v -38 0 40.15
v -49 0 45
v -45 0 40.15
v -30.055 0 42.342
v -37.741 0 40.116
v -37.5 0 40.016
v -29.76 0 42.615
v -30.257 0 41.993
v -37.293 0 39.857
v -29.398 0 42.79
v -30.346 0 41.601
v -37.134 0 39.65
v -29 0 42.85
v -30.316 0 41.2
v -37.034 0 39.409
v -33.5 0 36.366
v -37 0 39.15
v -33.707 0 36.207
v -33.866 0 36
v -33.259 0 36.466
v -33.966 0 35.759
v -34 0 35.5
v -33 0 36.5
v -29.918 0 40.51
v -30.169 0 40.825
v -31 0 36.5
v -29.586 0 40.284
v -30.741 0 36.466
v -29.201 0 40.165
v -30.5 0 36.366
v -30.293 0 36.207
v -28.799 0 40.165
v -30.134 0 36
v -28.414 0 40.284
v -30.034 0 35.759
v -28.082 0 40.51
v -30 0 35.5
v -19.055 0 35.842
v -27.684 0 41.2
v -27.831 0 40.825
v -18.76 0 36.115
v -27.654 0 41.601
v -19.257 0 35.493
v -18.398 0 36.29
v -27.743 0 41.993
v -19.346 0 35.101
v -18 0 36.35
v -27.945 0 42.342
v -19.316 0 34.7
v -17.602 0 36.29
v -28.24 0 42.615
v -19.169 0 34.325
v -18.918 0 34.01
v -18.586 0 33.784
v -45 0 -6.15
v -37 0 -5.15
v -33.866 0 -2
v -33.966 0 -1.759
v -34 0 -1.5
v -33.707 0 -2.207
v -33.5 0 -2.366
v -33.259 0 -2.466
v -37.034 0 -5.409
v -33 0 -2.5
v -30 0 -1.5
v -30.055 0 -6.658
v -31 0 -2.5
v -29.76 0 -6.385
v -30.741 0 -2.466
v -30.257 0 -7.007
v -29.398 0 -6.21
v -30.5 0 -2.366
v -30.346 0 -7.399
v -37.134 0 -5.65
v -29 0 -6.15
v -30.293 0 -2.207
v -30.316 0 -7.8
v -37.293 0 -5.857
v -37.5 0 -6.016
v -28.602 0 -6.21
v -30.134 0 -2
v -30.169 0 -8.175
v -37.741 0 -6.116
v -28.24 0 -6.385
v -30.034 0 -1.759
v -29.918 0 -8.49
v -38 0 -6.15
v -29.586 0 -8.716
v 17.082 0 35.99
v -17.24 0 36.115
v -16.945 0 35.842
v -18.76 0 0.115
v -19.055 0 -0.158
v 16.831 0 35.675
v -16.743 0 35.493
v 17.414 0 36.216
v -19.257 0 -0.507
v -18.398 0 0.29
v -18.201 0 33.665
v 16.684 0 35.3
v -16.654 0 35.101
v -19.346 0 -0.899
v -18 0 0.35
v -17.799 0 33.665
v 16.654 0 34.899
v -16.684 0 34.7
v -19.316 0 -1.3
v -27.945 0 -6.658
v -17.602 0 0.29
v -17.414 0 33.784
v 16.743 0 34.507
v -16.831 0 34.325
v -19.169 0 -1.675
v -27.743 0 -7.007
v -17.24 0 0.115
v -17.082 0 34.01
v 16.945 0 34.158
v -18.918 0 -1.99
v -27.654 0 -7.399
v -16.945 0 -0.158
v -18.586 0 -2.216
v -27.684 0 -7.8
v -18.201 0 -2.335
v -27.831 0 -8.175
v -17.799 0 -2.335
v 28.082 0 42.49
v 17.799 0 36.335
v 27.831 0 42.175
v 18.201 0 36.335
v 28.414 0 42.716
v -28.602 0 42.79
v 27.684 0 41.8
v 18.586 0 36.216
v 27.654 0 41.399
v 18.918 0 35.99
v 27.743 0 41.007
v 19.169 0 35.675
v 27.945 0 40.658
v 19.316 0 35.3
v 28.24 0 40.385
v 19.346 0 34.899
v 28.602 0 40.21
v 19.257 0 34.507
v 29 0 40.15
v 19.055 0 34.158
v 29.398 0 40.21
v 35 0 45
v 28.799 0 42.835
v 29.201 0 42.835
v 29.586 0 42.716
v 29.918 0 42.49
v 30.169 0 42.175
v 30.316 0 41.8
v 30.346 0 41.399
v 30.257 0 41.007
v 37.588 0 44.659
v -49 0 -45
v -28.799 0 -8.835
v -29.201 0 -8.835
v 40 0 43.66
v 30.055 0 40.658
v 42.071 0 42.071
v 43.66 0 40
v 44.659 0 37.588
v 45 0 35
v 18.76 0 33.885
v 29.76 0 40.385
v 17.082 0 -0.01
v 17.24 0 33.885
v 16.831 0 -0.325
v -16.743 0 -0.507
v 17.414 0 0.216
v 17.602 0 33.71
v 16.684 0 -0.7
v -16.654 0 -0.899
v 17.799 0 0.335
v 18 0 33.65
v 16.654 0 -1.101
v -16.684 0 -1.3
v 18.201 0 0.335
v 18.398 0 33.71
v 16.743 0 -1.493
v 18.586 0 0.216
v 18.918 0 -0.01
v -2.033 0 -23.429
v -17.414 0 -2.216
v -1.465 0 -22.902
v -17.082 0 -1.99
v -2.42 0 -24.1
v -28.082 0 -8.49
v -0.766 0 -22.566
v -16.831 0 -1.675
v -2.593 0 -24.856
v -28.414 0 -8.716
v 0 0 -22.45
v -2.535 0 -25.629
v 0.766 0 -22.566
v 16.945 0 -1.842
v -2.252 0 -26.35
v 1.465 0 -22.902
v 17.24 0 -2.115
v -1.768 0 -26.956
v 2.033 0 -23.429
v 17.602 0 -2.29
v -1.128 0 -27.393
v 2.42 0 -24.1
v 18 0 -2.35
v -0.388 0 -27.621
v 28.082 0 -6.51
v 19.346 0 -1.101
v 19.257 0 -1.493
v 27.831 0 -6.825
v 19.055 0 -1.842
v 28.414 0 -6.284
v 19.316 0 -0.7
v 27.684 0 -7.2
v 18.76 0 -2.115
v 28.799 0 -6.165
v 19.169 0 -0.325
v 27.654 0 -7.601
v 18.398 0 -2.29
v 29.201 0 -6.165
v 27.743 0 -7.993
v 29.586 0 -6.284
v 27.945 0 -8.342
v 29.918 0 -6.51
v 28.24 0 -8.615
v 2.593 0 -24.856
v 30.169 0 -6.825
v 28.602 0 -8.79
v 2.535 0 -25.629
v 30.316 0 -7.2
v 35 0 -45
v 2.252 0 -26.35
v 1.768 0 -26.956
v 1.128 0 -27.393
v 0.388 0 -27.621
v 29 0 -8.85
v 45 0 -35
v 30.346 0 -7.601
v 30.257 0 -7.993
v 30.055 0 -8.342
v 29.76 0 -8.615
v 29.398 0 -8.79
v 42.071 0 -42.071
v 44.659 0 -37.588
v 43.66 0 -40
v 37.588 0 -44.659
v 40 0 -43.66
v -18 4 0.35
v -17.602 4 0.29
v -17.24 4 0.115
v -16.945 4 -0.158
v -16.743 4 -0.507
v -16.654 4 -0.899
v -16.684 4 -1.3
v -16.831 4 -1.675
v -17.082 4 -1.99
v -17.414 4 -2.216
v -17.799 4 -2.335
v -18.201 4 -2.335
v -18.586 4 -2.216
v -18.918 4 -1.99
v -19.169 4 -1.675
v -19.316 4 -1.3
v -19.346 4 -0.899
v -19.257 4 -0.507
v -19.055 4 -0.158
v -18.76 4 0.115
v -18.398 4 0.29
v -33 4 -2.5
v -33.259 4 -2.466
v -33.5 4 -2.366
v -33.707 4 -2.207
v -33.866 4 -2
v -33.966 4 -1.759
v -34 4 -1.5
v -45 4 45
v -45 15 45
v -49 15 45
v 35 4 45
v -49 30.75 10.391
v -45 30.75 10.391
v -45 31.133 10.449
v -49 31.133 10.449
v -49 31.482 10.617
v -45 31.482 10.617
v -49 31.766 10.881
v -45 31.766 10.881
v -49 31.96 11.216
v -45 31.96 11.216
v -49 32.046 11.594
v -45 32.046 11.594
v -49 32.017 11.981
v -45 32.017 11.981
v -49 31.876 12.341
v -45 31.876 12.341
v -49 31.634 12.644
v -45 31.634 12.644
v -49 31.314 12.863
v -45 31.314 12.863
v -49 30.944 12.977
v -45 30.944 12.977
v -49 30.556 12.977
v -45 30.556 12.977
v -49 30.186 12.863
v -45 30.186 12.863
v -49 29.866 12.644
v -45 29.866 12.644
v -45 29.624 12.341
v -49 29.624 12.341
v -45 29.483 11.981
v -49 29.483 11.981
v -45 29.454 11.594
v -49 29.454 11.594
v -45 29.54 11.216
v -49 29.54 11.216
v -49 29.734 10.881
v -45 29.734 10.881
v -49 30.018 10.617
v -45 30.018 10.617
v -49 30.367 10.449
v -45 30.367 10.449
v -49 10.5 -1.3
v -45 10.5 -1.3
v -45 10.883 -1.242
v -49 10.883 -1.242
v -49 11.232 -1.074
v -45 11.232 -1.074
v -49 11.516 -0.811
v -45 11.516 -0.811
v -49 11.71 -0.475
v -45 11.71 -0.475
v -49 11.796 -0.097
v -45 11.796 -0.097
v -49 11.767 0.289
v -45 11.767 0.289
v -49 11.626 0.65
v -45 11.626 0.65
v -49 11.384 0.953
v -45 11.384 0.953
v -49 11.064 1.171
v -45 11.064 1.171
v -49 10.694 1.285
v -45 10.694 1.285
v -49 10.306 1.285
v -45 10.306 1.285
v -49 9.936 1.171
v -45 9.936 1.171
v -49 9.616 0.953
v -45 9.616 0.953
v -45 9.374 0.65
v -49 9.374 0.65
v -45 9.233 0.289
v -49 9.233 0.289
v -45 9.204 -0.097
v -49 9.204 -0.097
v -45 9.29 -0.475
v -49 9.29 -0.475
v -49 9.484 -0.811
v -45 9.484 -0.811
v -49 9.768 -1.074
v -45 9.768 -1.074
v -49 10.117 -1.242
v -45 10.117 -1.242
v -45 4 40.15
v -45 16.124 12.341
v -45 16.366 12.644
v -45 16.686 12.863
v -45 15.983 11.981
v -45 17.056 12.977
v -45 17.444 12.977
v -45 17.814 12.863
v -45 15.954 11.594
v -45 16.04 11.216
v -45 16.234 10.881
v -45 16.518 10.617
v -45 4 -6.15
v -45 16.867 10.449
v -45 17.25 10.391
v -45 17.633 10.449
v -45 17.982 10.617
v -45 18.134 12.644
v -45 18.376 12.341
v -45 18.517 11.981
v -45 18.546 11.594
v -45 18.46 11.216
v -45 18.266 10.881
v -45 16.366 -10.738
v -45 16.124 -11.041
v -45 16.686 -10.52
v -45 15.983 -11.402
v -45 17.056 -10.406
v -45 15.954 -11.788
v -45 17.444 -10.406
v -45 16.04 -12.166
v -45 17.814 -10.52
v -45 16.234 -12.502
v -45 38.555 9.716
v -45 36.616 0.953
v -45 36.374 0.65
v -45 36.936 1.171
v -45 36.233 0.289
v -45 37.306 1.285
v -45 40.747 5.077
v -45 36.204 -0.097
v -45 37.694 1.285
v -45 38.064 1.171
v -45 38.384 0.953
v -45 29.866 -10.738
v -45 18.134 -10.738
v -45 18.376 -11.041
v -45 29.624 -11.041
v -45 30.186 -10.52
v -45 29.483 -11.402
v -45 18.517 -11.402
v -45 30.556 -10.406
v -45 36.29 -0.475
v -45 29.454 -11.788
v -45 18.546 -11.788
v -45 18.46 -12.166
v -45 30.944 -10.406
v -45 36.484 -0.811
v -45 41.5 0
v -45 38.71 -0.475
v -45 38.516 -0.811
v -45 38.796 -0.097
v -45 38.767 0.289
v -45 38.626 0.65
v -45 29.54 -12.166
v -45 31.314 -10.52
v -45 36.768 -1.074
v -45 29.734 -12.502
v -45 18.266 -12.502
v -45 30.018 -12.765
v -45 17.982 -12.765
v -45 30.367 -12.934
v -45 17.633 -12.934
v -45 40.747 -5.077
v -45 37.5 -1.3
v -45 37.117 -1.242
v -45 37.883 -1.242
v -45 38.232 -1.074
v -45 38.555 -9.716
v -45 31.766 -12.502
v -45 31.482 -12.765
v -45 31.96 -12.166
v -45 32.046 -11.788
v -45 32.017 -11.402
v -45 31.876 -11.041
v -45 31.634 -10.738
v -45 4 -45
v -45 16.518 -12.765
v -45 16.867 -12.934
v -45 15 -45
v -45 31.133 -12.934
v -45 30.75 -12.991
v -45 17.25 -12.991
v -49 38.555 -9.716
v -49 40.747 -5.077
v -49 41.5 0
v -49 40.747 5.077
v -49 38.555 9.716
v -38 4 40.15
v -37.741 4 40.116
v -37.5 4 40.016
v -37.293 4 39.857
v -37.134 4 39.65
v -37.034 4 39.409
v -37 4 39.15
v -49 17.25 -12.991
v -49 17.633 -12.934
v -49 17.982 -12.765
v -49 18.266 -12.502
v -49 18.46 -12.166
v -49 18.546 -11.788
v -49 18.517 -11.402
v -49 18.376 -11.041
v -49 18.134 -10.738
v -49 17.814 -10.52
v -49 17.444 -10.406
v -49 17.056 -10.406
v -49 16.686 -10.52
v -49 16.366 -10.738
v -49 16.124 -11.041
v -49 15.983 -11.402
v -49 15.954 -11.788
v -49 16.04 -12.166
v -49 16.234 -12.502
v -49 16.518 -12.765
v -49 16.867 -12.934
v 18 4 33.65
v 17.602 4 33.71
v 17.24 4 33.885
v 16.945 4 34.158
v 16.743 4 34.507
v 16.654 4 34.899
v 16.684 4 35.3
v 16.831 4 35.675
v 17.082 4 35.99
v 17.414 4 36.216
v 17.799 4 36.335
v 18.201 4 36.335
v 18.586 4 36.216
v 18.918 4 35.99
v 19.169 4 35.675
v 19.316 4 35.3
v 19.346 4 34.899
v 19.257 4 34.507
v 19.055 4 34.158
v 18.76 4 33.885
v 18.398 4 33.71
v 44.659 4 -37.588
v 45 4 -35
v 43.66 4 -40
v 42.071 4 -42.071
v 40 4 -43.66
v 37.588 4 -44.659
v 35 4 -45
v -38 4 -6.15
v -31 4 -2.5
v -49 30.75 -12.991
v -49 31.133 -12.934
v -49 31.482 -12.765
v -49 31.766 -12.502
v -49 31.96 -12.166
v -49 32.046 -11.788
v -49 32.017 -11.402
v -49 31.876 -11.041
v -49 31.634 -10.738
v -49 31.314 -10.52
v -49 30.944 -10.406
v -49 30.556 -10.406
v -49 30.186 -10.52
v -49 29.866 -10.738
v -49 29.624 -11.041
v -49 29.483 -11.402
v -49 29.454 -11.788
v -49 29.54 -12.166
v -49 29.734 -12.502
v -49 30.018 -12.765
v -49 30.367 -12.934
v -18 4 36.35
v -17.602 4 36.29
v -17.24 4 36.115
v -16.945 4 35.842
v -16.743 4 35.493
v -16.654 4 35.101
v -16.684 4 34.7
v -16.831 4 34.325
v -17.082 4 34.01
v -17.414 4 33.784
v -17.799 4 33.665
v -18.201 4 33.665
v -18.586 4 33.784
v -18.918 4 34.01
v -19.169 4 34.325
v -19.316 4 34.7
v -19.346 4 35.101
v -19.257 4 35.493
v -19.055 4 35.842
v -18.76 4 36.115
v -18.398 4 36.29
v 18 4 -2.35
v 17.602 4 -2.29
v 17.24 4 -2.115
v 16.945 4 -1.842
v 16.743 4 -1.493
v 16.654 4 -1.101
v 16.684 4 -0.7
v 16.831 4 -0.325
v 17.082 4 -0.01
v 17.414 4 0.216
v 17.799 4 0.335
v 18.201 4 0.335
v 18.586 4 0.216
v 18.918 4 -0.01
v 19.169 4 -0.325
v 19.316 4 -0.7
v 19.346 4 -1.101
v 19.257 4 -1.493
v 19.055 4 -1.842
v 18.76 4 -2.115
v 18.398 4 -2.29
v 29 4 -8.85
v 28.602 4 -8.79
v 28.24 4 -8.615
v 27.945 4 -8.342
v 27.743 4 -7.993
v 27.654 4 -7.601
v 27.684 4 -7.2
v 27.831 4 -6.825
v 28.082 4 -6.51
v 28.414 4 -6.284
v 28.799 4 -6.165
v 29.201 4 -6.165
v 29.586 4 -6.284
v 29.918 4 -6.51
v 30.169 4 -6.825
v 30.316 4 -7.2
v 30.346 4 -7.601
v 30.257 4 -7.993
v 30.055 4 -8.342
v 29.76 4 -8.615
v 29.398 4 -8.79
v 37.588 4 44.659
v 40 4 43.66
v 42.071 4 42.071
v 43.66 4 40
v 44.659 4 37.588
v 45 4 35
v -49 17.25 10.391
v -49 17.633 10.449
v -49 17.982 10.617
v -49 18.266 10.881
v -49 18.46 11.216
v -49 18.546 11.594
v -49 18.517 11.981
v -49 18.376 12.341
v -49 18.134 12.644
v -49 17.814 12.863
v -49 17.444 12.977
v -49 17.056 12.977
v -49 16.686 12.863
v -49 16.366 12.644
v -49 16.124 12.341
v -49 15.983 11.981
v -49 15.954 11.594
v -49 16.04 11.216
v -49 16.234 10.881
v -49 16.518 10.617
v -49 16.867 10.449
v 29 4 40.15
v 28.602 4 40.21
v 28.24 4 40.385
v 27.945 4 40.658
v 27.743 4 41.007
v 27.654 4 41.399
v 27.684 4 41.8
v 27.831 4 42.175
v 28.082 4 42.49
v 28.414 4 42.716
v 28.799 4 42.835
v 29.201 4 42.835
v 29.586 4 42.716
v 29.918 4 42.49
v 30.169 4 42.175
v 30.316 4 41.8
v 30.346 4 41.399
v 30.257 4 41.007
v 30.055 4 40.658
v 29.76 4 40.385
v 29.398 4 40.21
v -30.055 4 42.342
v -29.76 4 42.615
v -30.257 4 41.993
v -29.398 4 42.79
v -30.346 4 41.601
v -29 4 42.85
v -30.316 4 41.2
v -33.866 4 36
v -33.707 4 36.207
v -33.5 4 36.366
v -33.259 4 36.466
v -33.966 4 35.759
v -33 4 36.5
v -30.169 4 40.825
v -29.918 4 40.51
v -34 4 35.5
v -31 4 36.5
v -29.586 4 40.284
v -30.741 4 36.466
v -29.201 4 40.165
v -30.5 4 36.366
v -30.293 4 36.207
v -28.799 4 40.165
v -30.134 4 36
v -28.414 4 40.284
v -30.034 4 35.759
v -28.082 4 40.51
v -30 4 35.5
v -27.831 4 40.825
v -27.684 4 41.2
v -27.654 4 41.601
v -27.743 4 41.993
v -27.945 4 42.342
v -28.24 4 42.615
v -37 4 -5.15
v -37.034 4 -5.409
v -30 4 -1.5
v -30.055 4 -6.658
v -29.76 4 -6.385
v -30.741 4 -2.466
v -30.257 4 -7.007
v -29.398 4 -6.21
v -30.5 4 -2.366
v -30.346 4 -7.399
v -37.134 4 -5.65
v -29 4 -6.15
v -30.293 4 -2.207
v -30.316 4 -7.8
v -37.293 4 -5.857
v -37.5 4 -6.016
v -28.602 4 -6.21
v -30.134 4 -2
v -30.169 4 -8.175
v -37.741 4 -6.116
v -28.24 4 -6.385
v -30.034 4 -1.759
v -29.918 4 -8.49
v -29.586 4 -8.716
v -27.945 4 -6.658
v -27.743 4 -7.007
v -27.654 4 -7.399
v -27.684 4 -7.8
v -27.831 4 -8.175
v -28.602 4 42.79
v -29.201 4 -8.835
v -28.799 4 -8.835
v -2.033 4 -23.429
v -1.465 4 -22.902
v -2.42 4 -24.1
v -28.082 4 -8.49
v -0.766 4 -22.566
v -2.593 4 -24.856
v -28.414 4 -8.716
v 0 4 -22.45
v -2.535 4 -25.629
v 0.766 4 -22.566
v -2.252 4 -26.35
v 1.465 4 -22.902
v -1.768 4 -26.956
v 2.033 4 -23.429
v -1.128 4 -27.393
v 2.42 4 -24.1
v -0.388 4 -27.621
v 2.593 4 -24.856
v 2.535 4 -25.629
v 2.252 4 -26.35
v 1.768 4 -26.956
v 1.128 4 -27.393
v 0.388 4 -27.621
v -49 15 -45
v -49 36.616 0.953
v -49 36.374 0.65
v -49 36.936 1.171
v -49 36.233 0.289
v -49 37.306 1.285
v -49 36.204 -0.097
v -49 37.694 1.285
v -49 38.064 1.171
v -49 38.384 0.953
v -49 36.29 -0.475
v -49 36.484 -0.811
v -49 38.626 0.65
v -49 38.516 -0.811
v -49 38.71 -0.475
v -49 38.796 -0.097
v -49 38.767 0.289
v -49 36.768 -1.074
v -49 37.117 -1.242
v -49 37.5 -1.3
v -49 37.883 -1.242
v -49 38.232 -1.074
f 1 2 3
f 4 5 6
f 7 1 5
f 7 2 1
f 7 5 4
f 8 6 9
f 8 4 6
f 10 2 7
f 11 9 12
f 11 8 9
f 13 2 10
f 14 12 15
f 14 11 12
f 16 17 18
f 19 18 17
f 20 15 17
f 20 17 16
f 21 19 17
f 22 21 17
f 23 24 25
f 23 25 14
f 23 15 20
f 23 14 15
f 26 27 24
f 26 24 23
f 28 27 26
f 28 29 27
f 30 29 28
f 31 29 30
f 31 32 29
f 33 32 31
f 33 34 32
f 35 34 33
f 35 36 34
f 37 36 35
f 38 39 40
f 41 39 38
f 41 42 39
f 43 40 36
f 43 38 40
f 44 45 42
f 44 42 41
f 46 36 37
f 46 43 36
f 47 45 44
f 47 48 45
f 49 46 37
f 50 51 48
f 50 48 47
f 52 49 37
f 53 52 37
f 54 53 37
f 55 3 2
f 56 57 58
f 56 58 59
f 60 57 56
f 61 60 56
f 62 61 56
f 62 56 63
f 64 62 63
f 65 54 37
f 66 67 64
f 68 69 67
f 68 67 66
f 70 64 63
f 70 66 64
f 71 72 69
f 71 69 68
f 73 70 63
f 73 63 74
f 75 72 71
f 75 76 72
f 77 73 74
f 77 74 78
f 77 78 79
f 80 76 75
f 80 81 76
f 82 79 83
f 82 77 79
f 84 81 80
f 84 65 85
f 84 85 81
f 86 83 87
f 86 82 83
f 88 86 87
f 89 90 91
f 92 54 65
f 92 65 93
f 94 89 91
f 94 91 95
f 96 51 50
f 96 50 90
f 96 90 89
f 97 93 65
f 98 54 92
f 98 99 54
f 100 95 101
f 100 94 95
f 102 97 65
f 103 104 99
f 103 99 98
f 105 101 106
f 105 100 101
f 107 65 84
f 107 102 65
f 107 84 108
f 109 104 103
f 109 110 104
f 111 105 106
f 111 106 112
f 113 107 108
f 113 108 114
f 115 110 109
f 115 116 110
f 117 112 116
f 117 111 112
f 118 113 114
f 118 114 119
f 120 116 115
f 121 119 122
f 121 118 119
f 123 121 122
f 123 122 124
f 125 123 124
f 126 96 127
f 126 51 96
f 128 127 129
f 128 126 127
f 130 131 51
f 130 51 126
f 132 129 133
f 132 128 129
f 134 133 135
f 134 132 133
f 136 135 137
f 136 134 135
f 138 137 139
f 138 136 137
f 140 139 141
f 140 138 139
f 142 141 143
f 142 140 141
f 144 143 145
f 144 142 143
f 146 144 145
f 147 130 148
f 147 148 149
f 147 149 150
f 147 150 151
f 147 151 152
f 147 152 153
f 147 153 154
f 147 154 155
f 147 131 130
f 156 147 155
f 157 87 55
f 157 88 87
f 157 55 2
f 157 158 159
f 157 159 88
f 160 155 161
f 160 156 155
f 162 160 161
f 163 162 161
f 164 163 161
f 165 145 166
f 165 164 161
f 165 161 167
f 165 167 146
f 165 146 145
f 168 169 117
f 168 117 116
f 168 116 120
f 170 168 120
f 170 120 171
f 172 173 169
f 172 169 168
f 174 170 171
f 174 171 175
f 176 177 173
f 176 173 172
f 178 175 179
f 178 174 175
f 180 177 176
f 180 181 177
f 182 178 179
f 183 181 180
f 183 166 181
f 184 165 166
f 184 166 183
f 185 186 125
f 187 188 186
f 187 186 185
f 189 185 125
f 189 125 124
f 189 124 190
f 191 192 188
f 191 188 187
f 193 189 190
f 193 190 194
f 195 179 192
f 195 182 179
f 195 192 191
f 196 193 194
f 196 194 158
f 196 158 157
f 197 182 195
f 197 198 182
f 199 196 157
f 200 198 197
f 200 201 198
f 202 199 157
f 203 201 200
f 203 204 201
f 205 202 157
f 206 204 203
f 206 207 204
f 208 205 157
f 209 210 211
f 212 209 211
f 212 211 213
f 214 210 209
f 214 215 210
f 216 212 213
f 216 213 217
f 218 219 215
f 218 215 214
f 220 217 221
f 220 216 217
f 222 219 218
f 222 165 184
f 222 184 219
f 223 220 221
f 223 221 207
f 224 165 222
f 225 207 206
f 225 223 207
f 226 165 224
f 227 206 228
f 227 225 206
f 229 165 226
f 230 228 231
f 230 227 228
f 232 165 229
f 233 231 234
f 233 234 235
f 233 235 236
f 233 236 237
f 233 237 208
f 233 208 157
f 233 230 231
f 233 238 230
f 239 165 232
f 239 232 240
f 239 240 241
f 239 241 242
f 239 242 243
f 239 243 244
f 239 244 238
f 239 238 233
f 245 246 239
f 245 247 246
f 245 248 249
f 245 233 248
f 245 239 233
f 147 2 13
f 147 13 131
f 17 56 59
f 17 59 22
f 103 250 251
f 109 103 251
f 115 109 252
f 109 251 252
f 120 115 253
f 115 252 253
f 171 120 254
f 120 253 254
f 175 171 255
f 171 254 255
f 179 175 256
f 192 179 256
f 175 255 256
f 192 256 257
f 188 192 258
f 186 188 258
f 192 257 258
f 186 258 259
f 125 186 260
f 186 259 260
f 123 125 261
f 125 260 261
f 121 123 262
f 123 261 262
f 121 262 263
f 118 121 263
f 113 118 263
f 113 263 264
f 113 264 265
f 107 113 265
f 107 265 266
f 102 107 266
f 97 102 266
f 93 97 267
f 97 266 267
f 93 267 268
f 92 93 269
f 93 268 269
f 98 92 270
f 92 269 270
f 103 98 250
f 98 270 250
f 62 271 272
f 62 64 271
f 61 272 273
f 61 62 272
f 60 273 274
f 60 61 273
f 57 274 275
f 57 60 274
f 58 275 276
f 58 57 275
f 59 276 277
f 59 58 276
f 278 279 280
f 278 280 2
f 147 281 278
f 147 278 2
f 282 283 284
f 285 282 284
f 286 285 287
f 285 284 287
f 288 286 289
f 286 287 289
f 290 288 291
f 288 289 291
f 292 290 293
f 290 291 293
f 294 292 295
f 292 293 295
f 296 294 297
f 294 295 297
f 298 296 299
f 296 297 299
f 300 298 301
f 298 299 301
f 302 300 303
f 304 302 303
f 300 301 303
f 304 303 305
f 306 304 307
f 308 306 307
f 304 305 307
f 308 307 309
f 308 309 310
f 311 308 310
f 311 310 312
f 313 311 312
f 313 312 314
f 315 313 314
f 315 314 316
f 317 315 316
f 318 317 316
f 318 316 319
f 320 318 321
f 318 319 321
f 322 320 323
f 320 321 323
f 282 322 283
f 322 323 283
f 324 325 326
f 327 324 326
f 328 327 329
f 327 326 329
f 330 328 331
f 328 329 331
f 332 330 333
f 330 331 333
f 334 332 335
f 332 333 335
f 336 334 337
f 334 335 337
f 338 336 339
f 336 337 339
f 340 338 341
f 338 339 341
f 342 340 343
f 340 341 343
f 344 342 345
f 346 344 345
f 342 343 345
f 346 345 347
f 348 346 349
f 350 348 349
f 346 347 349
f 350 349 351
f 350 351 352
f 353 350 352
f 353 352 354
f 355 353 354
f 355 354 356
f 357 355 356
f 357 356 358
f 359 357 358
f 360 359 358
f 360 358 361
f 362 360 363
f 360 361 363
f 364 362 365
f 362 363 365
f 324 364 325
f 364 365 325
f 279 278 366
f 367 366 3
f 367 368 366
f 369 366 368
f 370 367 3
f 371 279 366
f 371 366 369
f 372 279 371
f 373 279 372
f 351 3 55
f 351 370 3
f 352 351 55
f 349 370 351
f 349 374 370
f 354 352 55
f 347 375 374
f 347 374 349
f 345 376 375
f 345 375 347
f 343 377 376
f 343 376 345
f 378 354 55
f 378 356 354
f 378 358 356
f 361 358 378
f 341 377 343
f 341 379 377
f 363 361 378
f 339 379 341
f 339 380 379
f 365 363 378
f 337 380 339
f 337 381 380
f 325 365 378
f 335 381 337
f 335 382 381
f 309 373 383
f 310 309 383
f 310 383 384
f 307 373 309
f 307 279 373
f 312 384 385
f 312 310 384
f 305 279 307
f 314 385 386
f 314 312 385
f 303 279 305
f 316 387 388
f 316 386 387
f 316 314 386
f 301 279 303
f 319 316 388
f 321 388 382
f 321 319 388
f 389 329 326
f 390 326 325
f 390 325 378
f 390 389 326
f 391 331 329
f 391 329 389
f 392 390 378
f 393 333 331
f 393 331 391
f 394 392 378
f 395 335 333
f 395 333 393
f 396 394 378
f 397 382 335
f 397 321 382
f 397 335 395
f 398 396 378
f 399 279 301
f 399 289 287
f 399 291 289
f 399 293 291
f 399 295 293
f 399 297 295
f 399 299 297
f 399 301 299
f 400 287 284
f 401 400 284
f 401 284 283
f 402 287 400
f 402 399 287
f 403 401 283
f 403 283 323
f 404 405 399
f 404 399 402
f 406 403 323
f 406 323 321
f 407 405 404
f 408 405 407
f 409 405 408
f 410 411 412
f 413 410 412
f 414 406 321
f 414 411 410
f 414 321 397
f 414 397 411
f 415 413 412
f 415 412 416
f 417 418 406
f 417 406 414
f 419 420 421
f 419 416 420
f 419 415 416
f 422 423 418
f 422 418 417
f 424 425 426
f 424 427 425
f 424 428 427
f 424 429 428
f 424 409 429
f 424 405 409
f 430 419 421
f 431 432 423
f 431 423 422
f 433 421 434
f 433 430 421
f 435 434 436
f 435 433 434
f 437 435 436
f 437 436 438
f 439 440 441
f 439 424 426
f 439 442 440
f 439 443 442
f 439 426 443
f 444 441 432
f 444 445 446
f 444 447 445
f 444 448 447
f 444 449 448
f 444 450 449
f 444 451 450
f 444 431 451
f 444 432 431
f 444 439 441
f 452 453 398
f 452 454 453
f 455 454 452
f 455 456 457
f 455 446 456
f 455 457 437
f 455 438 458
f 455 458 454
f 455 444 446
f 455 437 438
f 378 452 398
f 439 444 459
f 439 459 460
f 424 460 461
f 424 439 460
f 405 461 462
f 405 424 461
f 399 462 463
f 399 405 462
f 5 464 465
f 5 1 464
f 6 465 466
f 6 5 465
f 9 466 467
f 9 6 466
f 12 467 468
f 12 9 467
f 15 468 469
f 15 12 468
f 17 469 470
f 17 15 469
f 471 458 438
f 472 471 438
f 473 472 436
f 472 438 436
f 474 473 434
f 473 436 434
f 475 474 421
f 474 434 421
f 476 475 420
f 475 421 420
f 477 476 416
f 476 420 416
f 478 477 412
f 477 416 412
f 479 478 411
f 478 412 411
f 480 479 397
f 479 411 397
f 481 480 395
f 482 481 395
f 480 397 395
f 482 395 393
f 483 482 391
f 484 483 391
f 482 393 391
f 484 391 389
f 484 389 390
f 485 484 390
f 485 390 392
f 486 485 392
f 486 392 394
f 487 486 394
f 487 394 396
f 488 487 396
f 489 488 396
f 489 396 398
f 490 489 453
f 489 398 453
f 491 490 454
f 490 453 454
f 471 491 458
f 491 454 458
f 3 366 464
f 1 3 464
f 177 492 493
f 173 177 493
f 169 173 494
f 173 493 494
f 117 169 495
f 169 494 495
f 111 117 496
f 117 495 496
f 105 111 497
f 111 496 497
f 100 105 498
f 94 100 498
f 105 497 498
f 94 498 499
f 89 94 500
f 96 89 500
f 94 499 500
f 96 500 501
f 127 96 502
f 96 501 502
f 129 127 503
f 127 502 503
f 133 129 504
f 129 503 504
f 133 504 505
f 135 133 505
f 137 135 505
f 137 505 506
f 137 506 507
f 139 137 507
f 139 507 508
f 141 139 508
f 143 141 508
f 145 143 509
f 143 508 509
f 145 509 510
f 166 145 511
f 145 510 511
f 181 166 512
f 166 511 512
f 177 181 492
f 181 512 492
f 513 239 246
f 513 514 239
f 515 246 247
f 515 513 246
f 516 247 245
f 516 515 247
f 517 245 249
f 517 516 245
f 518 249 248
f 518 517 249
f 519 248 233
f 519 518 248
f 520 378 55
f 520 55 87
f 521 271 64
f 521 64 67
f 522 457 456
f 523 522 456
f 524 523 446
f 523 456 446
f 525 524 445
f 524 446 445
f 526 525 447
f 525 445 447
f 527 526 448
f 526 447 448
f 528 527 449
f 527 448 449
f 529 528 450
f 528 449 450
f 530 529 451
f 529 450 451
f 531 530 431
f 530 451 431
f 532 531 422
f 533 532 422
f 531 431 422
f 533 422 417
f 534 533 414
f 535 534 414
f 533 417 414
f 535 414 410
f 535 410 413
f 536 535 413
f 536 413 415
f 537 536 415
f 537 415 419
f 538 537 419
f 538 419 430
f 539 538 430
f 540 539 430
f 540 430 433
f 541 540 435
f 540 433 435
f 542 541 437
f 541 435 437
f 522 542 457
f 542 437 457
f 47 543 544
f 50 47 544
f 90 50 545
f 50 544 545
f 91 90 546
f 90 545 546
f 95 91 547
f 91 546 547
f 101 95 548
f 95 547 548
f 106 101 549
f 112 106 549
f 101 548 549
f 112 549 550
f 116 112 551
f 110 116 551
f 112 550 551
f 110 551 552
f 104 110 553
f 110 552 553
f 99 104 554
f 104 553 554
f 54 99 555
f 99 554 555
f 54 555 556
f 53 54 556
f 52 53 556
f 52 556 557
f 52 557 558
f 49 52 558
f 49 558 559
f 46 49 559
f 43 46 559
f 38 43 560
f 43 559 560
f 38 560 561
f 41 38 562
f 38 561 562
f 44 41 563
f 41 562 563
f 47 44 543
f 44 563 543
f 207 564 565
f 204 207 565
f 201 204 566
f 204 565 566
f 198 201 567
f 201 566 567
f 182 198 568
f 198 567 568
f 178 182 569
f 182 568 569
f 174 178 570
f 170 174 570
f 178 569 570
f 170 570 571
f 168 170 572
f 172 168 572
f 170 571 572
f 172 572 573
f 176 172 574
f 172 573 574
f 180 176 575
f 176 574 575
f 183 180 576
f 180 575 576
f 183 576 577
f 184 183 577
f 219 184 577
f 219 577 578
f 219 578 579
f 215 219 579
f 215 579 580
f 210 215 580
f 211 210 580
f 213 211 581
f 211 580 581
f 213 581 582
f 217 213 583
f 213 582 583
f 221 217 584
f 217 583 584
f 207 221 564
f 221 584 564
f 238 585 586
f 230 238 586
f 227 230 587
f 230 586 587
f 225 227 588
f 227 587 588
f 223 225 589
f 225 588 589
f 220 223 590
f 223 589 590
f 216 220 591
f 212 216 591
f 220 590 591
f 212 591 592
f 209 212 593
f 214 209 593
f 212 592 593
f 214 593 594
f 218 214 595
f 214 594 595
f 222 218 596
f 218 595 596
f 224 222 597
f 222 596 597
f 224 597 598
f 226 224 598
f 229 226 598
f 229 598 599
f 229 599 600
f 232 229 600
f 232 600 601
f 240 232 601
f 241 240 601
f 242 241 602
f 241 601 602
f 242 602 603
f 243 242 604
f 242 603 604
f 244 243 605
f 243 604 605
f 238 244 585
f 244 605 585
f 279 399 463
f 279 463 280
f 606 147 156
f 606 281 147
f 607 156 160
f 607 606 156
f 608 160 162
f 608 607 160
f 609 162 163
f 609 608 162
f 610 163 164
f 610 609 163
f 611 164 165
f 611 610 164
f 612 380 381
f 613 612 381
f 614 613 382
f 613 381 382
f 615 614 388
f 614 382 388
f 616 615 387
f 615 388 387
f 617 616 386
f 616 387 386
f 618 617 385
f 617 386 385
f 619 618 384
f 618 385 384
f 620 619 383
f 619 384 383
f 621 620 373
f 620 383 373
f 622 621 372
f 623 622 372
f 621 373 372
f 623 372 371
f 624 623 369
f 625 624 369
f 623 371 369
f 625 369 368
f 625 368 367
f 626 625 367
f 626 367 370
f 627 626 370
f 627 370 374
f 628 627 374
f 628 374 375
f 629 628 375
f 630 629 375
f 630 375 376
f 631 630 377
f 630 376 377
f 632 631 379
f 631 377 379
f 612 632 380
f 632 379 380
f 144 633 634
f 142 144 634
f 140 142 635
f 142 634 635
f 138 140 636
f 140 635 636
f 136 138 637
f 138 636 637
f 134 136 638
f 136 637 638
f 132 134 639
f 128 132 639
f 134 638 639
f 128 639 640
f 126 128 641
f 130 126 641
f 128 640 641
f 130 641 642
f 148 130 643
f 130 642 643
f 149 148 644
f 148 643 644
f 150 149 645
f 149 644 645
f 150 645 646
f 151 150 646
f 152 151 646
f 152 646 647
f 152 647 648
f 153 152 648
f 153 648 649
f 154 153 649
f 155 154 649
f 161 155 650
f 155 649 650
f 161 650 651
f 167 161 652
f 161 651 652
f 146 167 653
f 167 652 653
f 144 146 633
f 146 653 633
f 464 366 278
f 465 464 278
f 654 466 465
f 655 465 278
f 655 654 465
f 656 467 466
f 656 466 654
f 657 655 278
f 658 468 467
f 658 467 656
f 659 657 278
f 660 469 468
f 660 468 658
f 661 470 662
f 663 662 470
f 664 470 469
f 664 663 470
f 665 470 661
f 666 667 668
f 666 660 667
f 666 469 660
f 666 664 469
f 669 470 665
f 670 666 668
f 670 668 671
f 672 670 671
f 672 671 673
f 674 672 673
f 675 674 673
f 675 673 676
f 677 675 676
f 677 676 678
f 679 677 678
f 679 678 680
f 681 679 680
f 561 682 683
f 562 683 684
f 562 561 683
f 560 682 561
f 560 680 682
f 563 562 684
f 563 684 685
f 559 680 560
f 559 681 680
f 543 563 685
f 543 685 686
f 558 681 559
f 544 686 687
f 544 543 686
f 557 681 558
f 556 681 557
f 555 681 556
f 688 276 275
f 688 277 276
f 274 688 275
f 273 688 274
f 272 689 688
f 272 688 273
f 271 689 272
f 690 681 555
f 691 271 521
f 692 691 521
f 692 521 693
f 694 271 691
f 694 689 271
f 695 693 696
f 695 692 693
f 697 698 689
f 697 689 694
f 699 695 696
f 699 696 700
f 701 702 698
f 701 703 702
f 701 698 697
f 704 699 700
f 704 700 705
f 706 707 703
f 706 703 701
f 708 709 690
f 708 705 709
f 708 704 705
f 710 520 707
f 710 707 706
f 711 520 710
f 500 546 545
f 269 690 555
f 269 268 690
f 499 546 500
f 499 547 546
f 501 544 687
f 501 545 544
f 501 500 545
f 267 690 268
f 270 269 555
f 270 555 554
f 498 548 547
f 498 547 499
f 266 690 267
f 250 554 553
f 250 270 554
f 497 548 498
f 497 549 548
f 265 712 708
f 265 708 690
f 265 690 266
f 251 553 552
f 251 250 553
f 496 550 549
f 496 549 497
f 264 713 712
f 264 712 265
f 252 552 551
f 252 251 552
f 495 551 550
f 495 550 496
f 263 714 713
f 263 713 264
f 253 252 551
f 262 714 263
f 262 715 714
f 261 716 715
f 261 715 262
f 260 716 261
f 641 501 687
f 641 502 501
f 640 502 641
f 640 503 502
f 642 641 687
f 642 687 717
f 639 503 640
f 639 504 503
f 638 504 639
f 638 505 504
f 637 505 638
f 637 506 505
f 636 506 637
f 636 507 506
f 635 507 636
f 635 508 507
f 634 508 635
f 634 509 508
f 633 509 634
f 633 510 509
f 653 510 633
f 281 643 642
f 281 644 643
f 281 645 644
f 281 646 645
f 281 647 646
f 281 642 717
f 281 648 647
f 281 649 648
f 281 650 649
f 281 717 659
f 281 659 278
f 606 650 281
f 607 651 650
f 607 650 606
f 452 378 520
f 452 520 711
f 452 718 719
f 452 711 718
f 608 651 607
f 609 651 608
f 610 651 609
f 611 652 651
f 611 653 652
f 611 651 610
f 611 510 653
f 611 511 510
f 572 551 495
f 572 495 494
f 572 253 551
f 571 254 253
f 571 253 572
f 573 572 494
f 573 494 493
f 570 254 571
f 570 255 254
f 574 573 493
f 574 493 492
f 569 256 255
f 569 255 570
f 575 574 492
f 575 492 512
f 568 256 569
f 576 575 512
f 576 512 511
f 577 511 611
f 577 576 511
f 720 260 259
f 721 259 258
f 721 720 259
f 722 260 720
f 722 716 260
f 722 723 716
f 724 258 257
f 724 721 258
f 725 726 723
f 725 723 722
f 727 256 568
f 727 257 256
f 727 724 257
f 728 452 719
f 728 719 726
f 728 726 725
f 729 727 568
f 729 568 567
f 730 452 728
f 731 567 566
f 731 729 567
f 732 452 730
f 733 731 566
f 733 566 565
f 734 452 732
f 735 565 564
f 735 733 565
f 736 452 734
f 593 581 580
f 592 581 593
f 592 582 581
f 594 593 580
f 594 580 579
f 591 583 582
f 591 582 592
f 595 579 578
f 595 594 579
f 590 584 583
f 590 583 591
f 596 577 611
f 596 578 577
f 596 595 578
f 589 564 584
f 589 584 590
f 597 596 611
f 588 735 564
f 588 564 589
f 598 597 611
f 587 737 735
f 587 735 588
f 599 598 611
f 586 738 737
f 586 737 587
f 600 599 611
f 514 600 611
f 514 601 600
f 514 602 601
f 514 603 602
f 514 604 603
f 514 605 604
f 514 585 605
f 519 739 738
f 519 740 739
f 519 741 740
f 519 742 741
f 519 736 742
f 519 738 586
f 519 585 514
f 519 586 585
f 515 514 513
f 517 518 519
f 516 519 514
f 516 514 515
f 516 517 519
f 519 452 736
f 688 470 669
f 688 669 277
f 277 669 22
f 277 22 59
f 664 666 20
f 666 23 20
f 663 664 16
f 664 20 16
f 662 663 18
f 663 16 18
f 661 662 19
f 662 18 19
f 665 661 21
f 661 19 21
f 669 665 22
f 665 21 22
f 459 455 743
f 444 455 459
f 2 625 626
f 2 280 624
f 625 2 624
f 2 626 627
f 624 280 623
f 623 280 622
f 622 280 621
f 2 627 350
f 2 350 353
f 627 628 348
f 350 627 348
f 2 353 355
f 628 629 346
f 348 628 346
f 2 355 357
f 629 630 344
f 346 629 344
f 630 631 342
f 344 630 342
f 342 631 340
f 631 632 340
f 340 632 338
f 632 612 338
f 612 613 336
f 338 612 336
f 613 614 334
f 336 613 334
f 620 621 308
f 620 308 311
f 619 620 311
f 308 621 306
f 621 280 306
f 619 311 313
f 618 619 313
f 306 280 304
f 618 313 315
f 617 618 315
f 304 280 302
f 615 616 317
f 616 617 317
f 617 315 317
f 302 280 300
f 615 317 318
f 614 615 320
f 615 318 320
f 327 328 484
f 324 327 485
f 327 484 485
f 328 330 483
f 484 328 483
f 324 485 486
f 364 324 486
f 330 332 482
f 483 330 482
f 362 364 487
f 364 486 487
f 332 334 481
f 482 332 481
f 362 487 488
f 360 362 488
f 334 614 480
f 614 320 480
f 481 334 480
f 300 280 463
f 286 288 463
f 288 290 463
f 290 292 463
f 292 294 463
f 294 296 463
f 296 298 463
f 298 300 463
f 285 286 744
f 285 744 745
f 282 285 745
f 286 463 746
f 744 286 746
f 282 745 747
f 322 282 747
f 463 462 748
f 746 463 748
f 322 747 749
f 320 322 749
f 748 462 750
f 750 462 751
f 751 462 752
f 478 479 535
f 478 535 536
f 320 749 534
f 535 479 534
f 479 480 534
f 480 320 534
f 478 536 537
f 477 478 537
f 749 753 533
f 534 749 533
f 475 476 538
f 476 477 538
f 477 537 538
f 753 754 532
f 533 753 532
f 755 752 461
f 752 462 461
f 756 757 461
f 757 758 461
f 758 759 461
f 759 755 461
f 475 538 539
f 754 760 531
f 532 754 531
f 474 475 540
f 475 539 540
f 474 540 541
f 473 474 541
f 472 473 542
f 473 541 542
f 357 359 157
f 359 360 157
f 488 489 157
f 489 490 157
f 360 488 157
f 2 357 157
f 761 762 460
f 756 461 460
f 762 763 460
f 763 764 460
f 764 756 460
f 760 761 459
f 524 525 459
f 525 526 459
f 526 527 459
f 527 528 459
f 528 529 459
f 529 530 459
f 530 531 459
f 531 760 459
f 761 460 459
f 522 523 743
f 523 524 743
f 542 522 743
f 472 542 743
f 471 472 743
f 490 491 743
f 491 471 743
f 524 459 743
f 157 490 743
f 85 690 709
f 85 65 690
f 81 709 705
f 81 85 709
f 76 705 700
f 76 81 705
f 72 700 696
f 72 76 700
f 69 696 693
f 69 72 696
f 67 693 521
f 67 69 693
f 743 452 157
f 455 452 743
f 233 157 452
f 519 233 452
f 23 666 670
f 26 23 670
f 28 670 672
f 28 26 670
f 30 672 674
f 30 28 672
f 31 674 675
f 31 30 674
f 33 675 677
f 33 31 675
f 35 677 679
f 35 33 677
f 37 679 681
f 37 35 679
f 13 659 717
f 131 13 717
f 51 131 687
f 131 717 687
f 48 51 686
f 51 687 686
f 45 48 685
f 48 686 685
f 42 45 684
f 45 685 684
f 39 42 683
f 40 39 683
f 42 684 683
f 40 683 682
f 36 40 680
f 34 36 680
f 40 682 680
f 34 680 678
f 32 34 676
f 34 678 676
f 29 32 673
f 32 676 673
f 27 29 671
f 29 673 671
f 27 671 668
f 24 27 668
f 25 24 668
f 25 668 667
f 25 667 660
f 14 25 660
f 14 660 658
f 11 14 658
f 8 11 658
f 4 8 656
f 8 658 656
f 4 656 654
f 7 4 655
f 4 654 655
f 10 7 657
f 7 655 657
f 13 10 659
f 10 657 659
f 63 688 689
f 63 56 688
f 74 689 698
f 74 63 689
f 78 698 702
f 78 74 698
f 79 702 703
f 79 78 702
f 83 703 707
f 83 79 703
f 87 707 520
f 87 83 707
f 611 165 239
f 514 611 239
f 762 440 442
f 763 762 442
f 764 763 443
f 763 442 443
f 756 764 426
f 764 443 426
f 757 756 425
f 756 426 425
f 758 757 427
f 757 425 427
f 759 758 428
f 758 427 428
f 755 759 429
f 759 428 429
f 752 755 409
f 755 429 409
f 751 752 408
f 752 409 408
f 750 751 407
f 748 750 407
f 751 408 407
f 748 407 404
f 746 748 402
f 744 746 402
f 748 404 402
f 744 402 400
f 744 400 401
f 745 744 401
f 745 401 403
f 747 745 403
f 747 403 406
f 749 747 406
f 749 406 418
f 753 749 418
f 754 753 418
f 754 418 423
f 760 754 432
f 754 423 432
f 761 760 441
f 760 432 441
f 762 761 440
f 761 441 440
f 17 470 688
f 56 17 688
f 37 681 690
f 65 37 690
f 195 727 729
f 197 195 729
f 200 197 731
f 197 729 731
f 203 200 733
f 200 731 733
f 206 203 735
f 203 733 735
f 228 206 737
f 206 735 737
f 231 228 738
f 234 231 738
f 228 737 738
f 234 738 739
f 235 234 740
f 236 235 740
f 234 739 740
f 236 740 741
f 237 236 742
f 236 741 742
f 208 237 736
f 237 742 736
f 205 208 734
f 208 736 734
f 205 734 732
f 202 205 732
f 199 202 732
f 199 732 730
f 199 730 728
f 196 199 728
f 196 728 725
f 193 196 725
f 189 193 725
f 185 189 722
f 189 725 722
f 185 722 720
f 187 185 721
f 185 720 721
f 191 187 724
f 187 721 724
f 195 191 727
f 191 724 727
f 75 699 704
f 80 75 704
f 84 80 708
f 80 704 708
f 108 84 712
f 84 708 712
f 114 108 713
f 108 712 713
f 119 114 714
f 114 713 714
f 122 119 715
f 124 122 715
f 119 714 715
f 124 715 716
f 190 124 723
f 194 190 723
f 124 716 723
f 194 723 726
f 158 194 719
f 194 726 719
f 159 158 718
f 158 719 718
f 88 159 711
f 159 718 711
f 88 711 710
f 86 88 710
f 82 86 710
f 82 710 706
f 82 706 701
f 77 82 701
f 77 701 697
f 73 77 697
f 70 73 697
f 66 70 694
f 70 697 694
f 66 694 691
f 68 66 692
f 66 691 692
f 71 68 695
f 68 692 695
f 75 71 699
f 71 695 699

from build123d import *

# Parameters (mm, degrees)
SKETCH_3_W          = 90
SKETCH_3_H          = 90
EXTRUDE_3_DEPTH     = 4
EXTRUDE_4_DEPTH     = 4
SKETCH_5_R          = 1.3
CUT_EXTRUDE_1_DEPTH = 4
SKETCH_6_R          = 2.6
SKETCH_6_R_2        = 1.35
CUT_EXTRUDE_2_DEPTH = 4
SKETCH_7_W          = 4
SKETCH_7_H          = 39
SKETCH_7_W_2        = 8
SKETCH_7_H_2        = 46.3
CUT_EXTRUDE_3_DEPTH = 4
FILLET_3_R          = 1
FILLET_4_R          = 10


with BuildPart() as part:
    # 草图3 → 凸台-拉伸3 (new body)
    with BuildSketch(Plane(origin=(0, 0, 0), x_dir=(1, 0, 0), z_dir=(0, 1, 0))):
        Rectangle(SKETCH_3_W, SKETCH_3_H)
    extrude(amount=EXTRUDE_3_DEPTH)

    # 草图4 → 凸台-拉伸4 (add)
    with BuildSketch(Plane.ZY.offset(45)):
        with BuildLine():
            Line((-45, 4), (-45, 15))
            Line((-45, 15), (-9.716498114, 38.55471279))
            ThreePointArc((-9.716498114, 38.55471279), (0, 41.5), (9.716498114, 38.55471279))
            Line((9.716498114, 38.55471279), (45, 15))
            Line((45, 15), (45, 4))
            Line((45, 4), (45, 0))
            Line((45, 0), (-45, 0))
            Line((-45, 0), (-45, 4))
        make_face()
    extrude(amount=EXTRUDE_4_DEPTH)

    # 草图5 → 切除-拉伸1 (cut)
    with BuildSketch(Plane(origin=(-45, 0, 0), x_dir=(0, 0, -1), z_dir=(1, 0, 0))):
        with Locations((0, 37.5)):
            Circle(SKETCH_5_R)
        with Locations((11.691342951, 30.75)):
            Circle(SKETCH_5_R)
        with Locations((11.691342951, 17.25)):
            Circle(SKETCH_5_R)
        with Locations((0, 10.5)):
            Circle(SKETCH_5_R)
        with Locations((-11.691342951, 17.25)):
            Circle(SKETCH_5_R)
        with Locations((-11.691342951, 30.75)):
            Circle(SKETCH_5_R)
    extrude(amount=-CUT_EXTRUDE_1_DEPTH, mode=Mode.SUBTRACT)

    # 草图6 → 切除-拉伸2 (cut)
    with BuildSketch(Plane(origin=(0, 4, 0), x_dir=(1, 0, 0), z_dir=(0, 1, 0))):
        with Locations(Location((0, 25.05, 0), (0, 0, 270))):
            Circle(SKETCH_6_R)
        with Locations(Location((-29, -41.5, 0), (0, 0, 270))):
            Circle(SKETCH_6_R_2)
        with Locations(Location((-29, 7.5, 0), (0, 0, 270))):
            Circle(SKETCH_6_R_2)
        with Locations(Location((-18, -35, 0), (0, 0, 270))):
            Circle(SKETCH_6_R_2)
        with Locations(Location((-18, 1, 0), (0, 0, 270))):
            Circle(SKETCH_6_R_2)
        with Locations(Location((29, -41.5, 0), (0, 0, 90))):
            Circle(SKETCH_6_R_2)
        with Locations(Location((18, -35, 0), (0, 0, 90))):
            Circle(SKETCH_6_R_2)
        with Locations(Location((18, 1, 0), (0, 0, 90))):
            Circle(SKETCH_6_R_2)
        with Locations(Location((29, 7.5, 0), (0, 0, 90))):
            Circle(SKETCH_6_R_2)
    extrude(amount=-CUT_EXTRUDE_2_DEPTH, mode=Mode.SUBTRACT)

    # 草图7 → 切除-拉伸3 (cut)
    with BuildSketch(Plane(origin=(0, 4, 0), x_dir=(1, 0, 0), z_dir=(0, 1, 0))):
        with Locations((-32, -17)):
            Rectangle(SKETCH_7_W, SKETCH_7_H)
        with Locations((-41, -17)):
            Rectangle(SKETCH_7_W_2, SKETCH_7_H_2)
    extrude(amount=-CUT_EXTRUDE_3_DEPTH, mode=Mode.SUBTRACT)

    # 圆角3
    fillet_3_edges = [part.edges().sort_by_distance(p)[0] for p in [
        (-37, 2, 40.15),
        (-37, 2, -6.15),
        (-30, 2, 36.5),
        (-30, 2, -2.5),
        (-34, 2, -2.5),
        (-34, 2, 36.5),
    ]]
    fillet(fillet_3_edges, radius=FILLET_3_R)

    # 圆角4
    fillet_4_edges = [part.edges().sort_by_distance(p)[0] for p in [
        (45, 2, 45),
        (45, 2, -45),
    ]]
    fillet(fillet_4_edges, radius=FILLET_4_R)


solid = part.part
